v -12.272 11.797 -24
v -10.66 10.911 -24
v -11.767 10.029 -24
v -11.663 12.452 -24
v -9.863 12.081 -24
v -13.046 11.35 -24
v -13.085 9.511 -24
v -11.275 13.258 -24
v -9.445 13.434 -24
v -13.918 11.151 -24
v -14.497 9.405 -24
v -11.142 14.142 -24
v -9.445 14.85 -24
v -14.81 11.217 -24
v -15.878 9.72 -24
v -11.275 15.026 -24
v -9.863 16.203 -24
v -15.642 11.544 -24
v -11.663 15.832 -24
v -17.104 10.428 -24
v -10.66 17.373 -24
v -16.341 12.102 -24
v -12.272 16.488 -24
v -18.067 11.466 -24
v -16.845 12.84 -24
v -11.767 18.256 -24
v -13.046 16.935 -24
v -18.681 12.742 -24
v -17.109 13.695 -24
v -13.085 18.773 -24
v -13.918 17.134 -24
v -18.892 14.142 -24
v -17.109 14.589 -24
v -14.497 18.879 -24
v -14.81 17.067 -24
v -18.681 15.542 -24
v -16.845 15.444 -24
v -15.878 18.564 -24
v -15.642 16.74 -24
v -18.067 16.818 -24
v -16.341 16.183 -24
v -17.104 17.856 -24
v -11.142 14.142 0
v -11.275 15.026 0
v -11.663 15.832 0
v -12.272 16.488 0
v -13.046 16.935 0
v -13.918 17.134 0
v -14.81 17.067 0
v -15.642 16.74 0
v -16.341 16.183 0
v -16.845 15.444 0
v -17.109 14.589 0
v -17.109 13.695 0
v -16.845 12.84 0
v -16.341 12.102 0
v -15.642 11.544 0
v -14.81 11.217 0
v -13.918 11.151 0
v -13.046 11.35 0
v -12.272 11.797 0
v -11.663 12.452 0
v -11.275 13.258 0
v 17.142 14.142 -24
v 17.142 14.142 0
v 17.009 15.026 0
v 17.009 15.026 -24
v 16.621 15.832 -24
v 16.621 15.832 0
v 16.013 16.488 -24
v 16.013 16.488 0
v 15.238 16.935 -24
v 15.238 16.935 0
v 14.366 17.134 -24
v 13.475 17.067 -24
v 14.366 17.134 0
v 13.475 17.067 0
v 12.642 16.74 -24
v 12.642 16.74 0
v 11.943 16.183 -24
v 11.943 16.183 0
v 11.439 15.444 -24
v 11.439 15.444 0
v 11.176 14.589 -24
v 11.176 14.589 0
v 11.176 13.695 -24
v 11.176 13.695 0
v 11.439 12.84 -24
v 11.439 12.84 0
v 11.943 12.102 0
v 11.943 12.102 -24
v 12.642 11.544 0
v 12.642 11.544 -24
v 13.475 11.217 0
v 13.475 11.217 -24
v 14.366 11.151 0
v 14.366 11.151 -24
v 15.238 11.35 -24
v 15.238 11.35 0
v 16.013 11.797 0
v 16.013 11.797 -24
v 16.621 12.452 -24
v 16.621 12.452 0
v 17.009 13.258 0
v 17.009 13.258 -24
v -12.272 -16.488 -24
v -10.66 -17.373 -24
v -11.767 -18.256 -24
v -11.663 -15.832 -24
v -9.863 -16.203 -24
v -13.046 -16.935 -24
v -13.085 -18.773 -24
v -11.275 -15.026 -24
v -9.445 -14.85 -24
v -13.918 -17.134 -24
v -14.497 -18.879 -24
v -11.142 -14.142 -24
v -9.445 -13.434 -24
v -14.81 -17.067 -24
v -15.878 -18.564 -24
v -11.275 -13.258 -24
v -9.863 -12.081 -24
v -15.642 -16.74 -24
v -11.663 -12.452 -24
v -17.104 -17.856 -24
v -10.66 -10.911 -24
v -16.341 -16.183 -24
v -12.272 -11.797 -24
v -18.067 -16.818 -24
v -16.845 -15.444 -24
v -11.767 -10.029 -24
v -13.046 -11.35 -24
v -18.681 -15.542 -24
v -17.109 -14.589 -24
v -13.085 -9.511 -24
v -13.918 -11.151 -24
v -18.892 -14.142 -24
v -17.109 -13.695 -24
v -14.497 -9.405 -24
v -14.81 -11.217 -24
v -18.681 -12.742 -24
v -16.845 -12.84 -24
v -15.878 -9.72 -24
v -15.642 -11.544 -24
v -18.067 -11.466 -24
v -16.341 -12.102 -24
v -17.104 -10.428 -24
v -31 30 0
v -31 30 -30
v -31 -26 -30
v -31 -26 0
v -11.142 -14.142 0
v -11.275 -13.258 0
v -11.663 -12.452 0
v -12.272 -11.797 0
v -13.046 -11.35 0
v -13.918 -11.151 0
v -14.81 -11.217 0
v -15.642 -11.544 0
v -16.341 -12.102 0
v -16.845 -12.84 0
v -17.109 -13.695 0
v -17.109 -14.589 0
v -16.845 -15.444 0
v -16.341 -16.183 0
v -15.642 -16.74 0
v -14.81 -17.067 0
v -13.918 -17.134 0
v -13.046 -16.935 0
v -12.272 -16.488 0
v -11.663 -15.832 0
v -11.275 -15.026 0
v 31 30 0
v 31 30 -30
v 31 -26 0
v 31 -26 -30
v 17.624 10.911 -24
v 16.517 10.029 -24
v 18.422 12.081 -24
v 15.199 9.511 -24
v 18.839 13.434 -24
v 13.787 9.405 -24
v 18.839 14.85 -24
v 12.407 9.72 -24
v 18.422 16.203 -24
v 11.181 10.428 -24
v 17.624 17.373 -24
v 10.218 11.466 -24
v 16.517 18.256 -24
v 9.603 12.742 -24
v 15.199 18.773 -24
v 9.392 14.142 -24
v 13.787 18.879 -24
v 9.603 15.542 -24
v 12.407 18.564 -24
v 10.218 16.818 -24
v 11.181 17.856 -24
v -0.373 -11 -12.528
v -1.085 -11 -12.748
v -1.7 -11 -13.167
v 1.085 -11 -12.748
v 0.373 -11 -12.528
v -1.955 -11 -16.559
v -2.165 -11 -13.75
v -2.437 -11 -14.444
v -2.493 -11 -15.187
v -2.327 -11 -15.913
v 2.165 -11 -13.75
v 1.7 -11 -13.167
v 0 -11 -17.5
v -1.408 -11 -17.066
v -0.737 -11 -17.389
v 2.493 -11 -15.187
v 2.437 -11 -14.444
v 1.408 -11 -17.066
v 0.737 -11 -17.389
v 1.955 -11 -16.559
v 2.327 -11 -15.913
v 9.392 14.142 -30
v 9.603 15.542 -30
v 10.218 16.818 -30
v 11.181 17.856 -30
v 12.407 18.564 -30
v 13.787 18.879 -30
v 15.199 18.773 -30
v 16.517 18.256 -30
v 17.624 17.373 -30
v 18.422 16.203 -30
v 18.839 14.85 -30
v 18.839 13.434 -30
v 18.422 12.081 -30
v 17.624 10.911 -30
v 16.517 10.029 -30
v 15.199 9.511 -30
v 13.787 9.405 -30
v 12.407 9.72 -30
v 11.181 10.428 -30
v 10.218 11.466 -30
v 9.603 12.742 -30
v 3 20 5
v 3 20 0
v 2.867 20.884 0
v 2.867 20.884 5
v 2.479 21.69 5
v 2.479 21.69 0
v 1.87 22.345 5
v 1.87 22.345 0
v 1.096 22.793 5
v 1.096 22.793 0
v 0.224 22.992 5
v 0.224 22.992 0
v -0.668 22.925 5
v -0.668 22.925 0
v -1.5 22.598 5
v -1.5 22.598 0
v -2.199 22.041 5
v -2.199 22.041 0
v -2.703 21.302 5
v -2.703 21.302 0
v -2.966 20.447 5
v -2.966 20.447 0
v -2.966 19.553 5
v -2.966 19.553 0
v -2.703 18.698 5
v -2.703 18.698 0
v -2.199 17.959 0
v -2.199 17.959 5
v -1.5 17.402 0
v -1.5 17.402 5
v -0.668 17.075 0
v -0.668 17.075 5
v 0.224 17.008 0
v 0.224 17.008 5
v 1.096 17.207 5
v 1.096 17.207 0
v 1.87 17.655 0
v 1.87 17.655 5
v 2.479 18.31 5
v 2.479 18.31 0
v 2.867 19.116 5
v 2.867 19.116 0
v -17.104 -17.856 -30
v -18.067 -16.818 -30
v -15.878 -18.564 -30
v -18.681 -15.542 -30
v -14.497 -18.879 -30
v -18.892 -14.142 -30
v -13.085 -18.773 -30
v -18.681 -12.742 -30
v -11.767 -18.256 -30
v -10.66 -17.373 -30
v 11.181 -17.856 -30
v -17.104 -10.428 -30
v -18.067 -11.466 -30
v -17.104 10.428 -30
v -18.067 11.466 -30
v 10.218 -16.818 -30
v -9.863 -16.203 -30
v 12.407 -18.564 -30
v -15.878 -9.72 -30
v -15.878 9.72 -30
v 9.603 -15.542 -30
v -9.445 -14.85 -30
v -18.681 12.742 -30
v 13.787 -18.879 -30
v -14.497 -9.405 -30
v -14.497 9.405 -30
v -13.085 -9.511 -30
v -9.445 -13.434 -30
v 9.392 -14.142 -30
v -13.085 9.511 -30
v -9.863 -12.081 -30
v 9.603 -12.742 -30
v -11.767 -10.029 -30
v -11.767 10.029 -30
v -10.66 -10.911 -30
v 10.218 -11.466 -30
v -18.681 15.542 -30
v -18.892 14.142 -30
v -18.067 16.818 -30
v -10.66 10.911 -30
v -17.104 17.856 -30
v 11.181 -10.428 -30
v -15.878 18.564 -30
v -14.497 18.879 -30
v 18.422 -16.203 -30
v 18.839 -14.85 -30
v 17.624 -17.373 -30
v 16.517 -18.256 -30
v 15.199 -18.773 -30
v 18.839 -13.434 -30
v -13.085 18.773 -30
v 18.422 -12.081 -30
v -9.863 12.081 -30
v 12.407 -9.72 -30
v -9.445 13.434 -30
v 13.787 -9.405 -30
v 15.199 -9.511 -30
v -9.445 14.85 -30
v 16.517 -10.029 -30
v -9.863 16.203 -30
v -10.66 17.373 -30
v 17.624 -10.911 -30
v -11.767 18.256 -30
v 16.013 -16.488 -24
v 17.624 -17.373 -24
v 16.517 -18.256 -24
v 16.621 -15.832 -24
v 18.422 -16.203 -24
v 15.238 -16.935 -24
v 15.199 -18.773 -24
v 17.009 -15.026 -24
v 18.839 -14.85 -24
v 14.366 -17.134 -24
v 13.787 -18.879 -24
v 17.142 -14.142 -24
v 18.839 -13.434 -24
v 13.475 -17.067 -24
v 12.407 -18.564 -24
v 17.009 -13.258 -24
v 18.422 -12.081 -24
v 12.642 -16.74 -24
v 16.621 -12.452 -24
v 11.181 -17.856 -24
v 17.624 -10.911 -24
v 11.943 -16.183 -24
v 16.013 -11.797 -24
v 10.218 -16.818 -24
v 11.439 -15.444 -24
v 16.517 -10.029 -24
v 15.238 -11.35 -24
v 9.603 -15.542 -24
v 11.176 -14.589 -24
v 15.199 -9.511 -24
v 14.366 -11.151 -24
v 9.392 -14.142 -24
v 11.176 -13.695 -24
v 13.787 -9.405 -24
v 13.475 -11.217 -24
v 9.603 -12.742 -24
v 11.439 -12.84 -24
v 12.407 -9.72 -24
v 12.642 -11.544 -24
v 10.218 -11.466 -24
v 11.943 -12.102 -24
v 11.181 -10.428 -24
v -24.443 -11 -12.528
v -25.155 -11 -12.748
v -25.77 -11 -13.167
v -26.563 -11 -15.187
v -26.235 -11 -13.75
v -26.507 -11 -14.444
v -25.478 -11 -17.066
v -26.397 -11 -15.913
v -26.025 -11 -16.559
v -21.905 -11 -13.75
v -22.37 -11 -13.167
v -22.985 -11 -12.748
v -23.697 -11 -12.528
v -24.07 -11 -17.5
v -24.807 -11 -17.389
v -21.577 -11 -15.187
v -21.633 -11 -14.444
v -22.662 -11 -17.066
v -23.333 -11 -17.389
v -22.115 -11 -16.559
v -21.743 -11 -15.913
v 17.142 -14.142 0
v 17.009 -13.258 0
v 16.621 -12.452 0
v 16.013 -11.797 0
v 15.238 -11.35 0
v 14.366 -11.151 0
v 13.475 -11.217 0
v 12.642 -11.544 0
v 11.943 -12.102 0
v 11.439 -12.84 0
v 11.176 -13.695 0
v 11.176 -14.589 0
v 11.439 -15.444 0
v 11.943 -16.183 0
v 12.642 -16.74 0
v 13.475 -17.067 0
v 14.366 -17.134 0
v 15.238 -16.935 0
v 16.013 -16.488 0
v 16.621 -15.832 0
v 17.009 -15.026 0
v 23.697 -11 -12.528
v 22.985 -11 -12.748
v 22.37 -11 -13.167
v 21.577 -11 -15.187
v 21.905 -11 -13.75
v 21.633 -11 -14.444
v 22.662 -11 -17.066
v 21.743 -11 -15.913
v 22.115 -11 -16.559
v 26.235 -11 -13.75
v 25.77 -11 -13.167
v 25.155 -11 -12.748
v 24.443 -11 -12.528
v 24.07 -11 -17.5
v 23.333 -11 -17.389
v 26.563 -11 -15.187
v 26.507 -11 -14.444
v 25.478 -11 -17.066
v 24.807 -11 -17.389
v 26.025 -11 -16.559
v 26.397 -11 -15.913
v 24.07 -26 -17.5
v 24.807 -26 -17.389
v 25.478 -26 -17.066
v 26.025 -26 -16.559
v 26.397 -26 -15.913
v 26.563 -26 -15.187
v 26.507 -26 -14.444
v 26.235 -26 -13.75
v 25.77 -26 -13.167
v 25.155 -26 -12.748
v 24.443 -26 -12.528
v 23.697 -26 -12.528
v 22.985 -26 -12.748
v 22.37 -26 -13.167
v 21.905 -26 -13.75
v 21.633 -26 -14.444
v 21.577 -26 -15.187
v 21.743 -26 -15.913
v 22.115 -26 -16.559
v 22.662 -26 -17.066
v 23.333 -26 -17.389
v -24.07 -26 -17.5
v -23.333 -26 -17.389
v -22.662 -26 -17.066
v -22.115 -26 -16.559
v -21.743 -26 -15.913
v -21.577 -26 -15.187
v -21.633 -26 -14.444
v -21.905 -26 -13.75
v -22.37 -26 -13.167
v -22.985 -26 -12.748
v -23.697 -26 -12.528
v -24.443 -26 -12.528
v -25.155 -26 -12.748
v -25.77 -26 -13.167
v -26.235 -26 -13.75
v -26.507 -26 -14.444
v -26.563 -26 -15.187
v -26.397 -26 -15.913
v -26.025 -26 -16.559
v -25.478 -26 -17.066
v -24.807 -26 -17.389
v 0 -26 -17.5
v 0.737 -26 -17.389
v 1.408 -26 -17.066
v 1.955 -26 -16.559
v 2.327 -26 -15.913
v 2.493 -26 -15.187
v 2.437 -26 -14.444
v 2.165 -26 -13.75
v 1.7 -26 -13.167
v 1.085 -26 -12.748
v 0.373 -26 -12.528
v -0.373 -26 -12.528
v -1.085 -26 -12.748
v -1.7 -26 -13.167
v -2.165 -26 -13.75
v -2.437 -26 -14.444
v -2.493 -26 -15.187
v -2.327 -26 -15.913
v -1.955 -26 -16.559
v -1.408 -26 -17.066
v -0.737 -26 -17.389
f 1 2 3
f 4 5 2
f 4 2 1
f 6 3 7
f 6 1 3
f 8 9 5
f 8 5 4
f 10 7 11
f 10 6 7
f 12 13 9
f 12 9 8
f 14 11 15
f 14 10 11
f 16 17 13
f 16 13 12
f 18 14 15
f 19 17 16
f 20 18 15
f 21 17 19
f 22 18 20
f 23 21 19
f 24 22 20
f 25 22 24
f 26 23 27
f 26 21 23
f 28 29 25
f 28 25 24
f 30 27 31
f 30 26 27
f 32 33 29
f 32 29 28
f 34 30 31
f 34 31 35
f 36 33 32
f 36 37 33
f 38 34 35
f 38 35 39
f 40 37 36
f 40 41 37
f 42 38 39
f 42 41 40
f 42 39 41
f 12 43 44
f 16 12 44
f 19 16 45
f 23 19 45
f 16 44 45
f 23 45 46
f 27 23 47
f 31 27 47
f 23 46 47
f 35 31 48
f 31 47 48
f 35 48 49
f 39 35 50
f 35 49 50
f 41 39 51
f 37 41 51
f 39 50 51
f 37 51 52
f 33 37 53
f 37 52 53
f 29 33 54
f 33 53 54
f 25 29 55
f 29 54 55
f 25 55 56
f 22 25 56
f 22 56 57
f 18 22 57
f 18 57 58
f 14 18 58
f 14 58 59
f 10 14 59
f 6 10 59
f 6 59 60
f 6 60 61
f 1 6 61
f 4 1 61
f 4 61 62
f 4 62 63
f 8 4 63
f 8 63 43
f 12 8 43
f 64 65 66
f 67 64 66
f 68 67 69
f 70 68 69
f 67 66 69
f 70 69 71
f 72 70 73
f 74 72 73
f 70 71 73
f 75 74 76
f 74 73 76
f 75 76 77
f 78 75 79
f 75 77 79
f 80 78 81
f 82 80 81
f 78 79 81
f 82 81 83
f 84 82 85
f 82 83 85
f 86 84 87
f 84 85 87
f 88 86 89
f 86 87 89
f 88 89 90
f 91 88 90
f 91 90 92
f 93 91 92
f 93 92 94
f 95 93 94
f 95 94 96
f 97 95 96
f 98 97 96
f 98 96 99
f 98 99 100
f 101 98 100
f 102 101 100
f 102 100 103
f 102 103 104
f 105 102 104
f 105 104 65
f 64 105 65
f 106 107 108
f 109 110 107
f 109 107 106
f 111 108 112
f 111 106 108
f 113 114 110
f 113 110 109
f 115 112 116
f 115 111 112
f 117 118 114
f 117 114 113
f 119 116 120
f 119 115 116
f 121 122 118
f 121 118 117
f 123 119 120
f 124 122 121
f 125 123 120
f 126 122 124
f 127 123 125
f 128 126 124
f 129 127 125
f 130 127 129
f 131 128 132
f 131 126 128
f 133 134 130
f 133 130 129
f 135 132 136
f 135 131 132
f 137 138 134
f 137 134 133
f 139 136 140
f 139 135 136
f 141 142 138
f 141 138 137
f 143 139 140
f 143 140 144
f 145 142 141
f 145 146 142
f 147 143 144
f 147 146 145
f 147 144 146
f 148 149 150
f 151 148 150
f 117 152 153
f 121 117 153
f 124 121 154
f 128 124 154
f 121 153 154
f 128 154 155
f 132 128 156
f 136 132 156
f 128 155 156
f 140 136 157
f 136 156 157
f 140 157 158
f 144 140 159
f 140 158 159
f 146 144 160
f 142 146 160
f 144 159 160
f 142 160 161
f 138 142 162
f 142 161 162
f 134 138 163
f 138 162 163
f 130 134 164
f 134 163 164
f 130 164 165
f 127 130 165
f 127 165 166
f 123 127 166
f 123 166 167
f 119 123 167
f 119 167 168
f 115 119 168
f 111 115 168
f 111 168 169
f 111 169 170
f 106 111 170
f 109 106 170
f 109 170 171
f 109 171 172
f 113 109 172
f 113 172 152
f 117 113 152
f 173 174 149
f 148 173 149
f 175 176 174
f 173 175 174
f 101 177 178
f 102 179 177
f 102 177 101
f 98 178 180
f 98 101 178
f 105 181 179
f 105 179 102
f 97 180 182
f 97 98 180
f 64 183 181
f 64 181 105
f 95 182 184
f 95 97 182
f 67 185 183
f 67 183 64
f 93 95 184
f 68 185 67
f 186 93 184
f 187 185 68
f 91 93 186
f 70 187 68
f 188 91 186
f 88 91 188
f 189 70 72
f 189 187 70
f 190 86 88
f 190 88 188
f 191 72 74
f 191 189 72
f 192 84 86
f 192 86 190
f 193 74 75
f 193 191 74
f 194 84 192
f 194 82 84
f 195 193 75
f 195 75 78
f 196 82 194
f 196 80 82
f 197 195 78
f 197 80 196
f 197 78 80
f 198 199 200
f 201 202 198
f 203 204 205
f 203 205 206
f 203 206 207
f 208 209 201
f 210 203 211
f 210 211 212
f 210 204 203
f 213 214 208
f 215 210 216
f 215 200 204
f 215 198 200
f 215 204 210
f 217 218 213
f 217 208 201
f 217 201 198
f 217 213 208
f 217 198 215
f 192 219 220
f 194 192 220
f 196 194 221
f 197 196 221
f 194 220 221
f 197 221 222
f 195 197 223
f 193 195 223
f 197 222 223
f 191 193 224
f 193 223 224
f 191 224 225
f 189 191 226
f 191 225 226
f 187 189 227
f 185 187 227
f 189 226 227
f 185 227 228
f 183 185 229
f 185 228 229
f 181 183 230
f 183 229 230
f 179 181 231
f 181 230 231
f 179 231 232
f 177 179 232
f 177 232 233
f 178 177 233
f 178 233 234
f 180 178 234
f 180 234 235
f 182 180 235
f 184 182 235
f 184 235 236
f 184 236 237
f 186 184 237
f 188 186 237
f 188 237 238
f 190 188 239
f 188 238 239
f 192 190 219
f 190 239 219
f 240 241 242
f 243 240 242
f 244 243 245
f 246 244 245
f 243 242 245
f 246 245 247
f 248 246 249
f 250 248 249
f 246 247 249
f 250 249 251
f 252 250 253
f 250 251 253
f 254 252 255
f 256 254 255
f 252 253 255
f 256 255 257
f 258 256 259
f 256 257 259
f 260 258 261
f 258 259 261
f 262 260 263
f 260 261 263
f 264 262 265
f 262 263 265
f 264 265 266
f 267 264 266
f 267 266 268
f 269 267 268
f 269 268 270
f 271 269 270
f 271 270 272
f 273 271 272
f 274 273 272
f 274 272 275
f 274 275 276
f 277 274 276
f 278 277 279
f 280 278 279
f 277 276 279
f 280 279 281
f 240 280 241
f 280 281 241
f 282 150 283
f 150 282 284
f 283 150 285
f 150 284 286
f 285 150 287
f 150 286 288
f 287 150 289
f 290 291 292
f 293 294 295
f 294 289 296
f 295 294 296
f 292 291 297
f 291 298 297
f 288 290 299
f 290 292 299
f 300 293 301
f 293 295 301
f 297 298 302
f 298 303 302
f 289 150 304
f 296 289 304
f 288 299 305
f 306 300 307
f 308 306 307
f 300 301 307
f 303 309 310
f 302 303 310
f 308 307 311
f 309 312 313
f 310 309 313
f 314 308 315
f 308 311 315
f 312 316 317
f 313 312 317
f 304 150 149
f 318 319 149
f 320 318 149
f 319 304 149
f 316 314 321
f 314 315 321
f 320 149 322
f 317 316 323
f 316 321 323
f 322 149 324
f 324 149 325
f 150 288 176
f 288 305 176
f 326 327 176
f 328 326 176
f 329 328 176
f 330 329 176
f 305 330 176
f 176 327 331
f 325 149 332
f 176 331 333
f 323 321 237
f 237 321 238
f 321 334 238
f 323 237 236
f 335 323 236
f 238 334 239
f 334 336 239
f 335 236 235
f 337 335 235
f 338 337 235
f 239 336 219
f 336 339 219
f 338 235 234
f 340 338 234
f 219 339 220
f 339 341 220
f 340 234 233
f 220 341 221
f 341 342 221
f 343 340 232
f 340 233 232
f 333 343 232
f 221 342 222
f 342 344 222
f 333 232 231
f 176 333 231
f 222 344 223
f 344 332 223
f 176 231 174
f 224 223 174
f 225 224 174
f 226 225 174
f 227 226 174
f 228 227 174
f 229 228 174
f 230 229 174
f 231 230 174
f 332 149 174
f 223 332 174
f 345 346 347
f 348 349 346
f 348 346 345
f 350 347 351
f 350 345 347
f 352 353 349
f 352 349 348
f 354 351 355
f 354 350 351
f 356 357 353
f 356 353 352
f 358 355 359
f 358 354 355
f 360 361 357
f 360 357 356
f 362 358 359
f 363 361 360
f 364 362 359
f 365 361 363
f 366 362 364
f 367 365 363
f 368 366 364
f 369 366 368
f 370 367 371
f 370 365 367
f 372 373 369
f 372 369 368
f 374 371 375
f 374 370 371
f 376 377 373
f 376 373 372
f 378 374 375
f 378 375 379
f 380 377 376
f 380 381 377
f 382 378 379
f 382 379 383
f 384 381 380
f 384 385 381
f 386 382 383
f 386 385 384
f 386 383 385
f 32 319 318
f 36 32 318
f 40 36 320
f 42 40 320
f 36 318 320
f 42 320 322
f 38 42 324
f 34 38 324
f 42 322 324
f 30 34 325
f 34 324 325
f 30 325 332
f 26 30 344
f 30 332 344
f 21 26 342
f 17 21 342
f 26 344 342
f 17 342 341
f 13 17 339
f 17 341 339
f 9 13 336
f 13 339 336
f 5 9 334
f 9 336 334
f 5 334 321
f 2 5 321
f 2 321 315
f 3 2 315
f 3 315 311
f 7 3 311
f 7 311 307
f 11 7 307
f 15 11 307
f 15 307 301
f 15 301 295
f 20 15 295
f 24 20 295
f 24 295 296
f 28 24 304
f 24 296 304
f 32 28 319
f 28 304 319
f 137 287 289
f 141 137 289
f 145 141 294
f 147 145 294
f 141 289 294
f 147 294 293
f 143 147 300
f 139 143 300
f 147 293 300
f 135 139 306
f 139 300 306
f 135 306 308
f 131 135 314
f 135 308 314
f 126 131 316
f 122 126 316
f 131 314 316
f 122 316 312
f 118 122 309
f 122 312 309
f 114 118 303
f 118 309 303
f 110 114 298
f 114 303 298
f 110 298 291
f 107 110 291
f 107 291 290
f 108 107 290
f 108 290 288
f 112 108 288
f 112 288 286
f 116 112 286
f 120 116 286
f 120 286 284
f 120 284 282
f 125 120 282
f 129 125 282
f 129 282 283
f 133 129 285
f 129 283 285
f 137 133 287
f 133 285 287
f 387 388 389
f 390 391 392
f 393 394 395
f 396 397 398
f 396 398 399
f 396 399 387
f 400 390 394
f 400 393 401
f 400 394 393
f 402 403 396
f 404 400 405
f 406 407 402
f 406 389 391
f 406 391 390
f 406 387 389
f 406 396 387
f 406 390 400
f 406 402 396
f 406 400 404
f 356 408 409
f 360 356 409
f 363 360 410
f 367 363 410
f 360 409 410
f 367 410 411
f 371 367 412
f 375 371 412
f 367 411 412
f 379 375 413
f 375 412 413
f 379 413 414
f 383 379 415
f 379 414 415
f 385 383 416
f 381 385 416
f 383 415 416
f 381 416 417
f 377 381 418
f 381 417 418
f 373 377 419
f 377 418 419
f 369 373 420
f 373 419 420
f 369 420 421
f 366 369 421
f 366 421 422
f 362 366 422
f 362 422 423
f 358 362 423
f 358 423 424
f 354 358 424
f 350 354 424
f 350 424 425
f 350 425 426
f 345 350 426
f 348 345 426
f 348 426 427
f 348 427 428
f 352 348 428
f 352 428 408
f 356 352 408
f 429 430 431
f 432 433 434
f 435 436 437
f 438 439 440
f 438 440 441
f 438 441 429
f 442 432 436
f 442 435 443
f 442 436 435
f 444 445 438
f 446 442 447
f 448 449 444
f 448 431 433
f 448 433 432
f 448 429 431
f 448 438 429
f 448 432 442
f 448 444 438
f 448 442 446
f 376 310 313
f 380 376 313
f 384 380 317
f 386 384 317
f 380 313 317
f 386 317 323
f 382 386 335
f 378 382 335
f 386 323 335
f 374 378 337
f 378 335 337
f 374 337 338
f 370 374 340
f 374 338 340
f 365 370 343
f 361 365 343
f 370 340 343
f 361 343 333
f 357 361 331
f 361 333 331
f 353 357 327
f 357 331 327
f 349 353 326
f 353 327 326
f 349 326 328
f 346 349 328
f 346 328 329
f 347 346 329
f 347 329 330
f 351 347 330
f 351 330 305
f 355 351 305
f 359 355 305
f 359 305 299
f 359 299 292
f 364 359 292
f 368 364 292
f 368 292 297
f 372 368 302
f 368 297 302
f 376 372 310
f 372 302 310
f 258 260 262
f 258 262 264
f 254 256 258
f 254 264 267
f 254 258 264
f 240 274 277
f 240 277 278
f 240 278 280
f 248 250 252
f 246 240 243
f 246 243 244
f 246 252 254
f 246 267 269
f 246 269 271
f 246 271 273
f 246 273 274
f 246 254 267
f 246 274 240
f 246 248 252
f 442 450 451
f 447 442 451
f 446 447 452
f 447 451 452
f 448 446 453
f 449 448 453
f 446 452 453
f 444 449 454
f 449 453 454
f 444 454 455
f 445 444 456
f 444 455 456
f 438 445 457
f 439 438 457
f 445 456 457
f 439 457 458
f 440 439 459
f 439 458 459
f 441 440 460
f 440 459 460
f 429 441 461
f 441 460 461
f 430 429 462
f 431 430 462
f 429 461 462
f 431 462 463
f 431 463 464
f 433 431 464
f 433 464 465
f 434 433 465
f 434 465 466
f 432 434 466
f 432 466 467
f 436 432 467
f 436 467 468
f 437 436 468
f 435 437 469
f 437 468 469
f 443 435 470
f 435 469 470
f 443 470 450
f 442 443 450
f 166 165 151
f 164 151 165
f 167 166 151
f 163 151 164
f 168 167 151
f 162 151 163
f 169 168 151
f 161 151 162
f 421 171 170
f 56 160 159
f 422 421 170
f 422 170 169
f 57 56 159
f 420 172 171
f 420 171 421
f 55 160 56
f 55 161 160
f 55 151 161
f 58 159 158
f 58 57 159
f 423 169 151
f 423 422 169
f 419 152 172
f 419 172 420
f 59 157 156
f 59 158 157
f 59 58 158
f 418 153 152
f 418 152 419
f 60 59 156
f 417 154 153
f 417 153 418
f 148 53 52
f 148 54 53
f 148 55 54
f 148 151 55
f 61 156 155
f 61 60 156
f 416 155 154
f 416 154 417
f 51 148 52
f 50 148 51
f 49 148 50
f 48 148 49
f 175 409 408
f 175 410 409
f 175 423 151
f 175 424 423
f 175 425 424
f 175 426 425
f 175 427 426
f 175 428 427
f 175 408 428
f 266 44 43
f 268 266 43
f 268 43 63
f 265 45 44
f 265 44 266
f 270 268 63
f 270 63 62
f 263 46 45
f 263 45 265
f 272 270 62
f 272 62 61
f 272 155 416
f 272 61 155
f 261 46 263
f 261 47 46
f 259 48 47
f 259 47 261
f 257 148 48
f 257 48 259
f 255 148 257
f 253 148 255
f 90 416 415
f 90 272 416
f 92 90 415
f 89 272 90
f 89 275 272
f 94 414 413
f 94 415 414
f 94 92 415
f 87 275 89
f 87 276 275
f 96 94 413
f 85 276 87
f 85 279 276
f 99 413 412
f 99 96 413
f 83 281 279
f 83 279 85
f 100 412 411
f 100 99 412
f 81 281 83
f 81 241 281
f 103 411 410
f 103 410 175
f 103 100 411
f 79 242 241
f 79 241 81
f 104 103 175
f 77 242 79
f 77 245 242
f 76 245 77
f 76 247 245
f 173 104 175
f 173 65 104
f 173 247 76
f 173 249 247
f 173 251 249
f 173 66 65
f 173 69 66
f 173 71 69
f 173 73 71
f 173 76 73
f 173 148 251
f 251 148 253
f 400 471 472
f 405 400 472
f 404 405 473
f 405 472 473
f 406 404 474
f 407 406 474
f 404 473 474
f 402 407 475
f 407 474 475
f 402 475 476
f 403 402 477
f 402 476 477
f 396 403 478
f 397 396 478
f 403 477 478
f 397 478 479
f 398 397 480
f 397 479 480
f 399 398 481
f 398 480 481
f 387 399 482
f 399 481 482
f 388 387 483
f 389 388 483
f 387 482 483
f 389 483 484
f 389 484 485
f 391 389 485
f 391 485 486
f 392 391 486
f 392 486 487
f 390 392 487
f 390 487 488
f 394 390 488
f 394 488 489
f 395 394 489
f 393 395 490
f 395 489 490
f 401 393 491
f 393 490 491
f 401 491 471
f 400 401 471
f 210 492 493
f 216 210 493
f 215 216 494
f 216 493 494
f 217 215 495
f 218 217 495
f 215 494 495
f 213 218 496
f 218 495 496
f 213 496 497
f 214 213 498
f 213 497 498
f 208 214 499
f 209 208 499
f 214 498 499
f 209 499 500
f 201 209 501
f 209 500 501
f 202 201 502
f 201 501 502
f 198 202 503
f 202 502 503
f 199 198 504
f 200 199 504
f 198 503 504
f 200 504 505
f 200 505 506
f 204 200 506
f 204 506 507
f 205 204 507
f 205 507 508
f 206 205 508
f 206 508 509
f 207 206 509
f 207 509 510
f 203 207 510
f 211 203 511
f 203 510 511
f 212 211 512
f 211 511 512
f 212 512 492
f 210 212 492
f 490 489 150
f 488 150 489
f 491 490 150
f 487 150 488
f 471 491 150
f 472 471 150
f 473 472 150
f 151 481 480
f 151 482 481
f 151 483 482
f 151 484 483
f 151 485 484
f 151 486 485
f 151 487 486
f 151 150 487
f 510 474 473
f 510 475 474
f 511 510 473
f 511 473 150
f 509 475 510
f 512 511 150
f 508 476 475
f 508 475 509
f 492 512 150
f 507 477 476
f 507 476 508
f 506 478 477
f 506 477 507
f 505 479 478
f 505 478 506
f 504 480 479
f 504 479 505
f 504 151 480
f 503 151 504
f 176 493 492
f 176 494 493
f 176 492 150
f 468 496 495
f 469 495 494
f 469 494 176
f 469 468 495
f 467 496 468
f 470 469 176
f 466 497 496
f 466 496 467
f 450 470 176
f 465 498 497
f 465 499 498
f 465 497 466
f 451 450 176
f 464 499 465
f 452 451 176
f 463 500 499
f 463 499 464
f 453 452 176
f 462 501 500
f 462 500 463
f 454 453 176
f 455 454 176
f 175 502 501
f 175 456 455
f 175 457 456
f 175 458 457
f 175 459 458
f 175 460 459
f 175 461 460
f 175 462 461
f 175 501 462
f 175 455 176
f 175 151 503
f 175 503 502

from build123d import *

# Parameters (mm, degrees)
ESBO_O1_R                = 60
ESBO_O1_R_2              = 3
RESSALTO_EXTRUS_O4_DEPTH = 30
ESBO_O6_R                = 60
ESBO_O6_R_2              = 5
RESSALTO_EXTRUS_O8_DEPTH = 30
ESBO_O9_R                = 60
CORTE_EXTRUS_O1_DEPTH    = 91
ESBO_O11_W               = 62
ESBO_O11_H               = 15
CORTE_EXTRUS_O2_DEPTH    = 60.514704065
ESBO_O12_R               = 2.5
CORTE_EXTRUS_O3_DEPTH    = 15
ESBO_O15_R               = 3
RESSALTO_EXTRUS_O9_DEPTH = 5
ESBO_O16_R               = 4.75
CORTE_EXTRUS_O4_DEPTH    = 6


with BuildPart() as part:
    # Esboço1 → Ressalto-extrusão4 (new body)
    with BuildSketch(Plane.XY):
        Circle(ESBO_O1_R)
        with Locations((-14.142135624, 14.142135624)):
            Circle(ESBO_O1_R_2, mode=Mode.SUBTRACT)
        with Locations((14.142135624, 14.142135624)):
            Circle(ESBO_O1_R_2, mode=Mode.SUBTRACT)
        with Locations((14.142135624, -14.142135624)):
            Circle(ESBO_O1_R_2, mode=Mode.SUBTRACT)
        with Locations((-14.142135624, -14.142135624)):
            Circle(ESBO_O1_R_2, mode=Mode.SUBTRACT)
        with Locations((0, 20)):
            Circle(ESBO_O1_R_2, mode=Mode.SUBTRACT)
    extrude(amount=-RESSALTO_EXTRUS_O4_DEPTH)

    # Esboço6 → Ressalto-extrusão8 (add)
    with BuildSketch(Plane.XY):
        Circle(ESBO_O6_R)
        with Locations((-14.142135624, -14.142135624)):
            Circle(ESBO_O6_R_2, mode=Mode.SUBTRACT)
        with Locations((14.142135624, -14.142135624)):
            Circle(ESBO_O6_R_2, mode=Mode.SUBTRACT)
        with Locations((-14.142135624, 14.142135624)):
            Circle(ESBO_O6_R_2, mode=Mode.SUBTRACT)
        with Locations((14.142135624, 14.142135624)):
            Circle(ESBO_O6_R_2, mode=Mode.SUBTRACT)
    extrude(amount=-RESSALTO_EXTRUS_O8_DEPTH)

    # Esboço9 → Corte-extrusão1 (cut, through all)
    with BuildSketch(Plane(origin=(0, 0, -30), x_dir=(-1, 0, 0), z_dir=(0, 0, -1))):
        Circle(ESBO_O9_R)
        Polygon((-31, 30), (0, 30), (31, 30), (31, 0), (31, -31), (31, -41), (-31, -41), (-31, -31), (-31, 0), align=None, mode=Mode.SUBTRACT)
    extrude(amount=-CORTE_EXTRUS_O1_DEPTH, mode=Mode.SUBTRACT)

    # Esboço11 → Corte-extrusão2 (cut, through all)
    with BuildSketch(Plane.XY):
        with Locations((0, -33.5)):
            Rectangle(ESBO_O11_W, ESBO_O11_H)
    extrude(amount=-CORTE_EXTRUS_O2_DEPTH, mode=Mode.SUBTRACT)

    # Esboço12 → Corte-extrusão3 (cut)
    with BuildSketch(Plane.XZ.offset(26)):
        with Locations(Location((24.07, -15, 0), (0, 0, 270))):
            Circle(ESBO_O12_R)
        with Locations(Location((0, -15, 0), (0, 0, 270))):
            Circle(ESBO_O12_R)
        with Locations(Location((-24.07, -15, 0), (0, 0, 270))):
            Circle(ESBO_O12_R)
    extrude(amount=-CORTE_EXTRUS_O3_DEPTH, mode=Mode.SUBTRACT)

    # Esboço15 → Ressalto-extrusão9 (add)
    with BuildSketch(Plane.XY):
        with Locations((0, 20)):
            Circle(ESBO_O15_R)
    extrude(amount=RESSALTO_EXTRUS_O9_DEPTH)

    # Esboço16 → Corte-extrusão4 (cut)
    with BuildSketch(Plane(origin=(0, 0, -30), x_dir=(-1, 0, 0), z_dir=(0, 0, -1))):
        with Locations((14.142135624, 14.142135624)):
            Circle(ESBO_O16_R)
        with Locations((14.142135624, -14.142135624)):
            Circle(ESBO_O16_R)
        with Locations((-14.142135624, 14.142135624)):
            Circle(ESBO_O16_R)
        with Locations((-14.142135624, -14.142135624)):
            Circle(ESBO_O16_R)
    extrude(amount=-CORTE_EXTRUS_O4_DEPTH, mode=Mode.SUBTRACT)


solid = part.part
